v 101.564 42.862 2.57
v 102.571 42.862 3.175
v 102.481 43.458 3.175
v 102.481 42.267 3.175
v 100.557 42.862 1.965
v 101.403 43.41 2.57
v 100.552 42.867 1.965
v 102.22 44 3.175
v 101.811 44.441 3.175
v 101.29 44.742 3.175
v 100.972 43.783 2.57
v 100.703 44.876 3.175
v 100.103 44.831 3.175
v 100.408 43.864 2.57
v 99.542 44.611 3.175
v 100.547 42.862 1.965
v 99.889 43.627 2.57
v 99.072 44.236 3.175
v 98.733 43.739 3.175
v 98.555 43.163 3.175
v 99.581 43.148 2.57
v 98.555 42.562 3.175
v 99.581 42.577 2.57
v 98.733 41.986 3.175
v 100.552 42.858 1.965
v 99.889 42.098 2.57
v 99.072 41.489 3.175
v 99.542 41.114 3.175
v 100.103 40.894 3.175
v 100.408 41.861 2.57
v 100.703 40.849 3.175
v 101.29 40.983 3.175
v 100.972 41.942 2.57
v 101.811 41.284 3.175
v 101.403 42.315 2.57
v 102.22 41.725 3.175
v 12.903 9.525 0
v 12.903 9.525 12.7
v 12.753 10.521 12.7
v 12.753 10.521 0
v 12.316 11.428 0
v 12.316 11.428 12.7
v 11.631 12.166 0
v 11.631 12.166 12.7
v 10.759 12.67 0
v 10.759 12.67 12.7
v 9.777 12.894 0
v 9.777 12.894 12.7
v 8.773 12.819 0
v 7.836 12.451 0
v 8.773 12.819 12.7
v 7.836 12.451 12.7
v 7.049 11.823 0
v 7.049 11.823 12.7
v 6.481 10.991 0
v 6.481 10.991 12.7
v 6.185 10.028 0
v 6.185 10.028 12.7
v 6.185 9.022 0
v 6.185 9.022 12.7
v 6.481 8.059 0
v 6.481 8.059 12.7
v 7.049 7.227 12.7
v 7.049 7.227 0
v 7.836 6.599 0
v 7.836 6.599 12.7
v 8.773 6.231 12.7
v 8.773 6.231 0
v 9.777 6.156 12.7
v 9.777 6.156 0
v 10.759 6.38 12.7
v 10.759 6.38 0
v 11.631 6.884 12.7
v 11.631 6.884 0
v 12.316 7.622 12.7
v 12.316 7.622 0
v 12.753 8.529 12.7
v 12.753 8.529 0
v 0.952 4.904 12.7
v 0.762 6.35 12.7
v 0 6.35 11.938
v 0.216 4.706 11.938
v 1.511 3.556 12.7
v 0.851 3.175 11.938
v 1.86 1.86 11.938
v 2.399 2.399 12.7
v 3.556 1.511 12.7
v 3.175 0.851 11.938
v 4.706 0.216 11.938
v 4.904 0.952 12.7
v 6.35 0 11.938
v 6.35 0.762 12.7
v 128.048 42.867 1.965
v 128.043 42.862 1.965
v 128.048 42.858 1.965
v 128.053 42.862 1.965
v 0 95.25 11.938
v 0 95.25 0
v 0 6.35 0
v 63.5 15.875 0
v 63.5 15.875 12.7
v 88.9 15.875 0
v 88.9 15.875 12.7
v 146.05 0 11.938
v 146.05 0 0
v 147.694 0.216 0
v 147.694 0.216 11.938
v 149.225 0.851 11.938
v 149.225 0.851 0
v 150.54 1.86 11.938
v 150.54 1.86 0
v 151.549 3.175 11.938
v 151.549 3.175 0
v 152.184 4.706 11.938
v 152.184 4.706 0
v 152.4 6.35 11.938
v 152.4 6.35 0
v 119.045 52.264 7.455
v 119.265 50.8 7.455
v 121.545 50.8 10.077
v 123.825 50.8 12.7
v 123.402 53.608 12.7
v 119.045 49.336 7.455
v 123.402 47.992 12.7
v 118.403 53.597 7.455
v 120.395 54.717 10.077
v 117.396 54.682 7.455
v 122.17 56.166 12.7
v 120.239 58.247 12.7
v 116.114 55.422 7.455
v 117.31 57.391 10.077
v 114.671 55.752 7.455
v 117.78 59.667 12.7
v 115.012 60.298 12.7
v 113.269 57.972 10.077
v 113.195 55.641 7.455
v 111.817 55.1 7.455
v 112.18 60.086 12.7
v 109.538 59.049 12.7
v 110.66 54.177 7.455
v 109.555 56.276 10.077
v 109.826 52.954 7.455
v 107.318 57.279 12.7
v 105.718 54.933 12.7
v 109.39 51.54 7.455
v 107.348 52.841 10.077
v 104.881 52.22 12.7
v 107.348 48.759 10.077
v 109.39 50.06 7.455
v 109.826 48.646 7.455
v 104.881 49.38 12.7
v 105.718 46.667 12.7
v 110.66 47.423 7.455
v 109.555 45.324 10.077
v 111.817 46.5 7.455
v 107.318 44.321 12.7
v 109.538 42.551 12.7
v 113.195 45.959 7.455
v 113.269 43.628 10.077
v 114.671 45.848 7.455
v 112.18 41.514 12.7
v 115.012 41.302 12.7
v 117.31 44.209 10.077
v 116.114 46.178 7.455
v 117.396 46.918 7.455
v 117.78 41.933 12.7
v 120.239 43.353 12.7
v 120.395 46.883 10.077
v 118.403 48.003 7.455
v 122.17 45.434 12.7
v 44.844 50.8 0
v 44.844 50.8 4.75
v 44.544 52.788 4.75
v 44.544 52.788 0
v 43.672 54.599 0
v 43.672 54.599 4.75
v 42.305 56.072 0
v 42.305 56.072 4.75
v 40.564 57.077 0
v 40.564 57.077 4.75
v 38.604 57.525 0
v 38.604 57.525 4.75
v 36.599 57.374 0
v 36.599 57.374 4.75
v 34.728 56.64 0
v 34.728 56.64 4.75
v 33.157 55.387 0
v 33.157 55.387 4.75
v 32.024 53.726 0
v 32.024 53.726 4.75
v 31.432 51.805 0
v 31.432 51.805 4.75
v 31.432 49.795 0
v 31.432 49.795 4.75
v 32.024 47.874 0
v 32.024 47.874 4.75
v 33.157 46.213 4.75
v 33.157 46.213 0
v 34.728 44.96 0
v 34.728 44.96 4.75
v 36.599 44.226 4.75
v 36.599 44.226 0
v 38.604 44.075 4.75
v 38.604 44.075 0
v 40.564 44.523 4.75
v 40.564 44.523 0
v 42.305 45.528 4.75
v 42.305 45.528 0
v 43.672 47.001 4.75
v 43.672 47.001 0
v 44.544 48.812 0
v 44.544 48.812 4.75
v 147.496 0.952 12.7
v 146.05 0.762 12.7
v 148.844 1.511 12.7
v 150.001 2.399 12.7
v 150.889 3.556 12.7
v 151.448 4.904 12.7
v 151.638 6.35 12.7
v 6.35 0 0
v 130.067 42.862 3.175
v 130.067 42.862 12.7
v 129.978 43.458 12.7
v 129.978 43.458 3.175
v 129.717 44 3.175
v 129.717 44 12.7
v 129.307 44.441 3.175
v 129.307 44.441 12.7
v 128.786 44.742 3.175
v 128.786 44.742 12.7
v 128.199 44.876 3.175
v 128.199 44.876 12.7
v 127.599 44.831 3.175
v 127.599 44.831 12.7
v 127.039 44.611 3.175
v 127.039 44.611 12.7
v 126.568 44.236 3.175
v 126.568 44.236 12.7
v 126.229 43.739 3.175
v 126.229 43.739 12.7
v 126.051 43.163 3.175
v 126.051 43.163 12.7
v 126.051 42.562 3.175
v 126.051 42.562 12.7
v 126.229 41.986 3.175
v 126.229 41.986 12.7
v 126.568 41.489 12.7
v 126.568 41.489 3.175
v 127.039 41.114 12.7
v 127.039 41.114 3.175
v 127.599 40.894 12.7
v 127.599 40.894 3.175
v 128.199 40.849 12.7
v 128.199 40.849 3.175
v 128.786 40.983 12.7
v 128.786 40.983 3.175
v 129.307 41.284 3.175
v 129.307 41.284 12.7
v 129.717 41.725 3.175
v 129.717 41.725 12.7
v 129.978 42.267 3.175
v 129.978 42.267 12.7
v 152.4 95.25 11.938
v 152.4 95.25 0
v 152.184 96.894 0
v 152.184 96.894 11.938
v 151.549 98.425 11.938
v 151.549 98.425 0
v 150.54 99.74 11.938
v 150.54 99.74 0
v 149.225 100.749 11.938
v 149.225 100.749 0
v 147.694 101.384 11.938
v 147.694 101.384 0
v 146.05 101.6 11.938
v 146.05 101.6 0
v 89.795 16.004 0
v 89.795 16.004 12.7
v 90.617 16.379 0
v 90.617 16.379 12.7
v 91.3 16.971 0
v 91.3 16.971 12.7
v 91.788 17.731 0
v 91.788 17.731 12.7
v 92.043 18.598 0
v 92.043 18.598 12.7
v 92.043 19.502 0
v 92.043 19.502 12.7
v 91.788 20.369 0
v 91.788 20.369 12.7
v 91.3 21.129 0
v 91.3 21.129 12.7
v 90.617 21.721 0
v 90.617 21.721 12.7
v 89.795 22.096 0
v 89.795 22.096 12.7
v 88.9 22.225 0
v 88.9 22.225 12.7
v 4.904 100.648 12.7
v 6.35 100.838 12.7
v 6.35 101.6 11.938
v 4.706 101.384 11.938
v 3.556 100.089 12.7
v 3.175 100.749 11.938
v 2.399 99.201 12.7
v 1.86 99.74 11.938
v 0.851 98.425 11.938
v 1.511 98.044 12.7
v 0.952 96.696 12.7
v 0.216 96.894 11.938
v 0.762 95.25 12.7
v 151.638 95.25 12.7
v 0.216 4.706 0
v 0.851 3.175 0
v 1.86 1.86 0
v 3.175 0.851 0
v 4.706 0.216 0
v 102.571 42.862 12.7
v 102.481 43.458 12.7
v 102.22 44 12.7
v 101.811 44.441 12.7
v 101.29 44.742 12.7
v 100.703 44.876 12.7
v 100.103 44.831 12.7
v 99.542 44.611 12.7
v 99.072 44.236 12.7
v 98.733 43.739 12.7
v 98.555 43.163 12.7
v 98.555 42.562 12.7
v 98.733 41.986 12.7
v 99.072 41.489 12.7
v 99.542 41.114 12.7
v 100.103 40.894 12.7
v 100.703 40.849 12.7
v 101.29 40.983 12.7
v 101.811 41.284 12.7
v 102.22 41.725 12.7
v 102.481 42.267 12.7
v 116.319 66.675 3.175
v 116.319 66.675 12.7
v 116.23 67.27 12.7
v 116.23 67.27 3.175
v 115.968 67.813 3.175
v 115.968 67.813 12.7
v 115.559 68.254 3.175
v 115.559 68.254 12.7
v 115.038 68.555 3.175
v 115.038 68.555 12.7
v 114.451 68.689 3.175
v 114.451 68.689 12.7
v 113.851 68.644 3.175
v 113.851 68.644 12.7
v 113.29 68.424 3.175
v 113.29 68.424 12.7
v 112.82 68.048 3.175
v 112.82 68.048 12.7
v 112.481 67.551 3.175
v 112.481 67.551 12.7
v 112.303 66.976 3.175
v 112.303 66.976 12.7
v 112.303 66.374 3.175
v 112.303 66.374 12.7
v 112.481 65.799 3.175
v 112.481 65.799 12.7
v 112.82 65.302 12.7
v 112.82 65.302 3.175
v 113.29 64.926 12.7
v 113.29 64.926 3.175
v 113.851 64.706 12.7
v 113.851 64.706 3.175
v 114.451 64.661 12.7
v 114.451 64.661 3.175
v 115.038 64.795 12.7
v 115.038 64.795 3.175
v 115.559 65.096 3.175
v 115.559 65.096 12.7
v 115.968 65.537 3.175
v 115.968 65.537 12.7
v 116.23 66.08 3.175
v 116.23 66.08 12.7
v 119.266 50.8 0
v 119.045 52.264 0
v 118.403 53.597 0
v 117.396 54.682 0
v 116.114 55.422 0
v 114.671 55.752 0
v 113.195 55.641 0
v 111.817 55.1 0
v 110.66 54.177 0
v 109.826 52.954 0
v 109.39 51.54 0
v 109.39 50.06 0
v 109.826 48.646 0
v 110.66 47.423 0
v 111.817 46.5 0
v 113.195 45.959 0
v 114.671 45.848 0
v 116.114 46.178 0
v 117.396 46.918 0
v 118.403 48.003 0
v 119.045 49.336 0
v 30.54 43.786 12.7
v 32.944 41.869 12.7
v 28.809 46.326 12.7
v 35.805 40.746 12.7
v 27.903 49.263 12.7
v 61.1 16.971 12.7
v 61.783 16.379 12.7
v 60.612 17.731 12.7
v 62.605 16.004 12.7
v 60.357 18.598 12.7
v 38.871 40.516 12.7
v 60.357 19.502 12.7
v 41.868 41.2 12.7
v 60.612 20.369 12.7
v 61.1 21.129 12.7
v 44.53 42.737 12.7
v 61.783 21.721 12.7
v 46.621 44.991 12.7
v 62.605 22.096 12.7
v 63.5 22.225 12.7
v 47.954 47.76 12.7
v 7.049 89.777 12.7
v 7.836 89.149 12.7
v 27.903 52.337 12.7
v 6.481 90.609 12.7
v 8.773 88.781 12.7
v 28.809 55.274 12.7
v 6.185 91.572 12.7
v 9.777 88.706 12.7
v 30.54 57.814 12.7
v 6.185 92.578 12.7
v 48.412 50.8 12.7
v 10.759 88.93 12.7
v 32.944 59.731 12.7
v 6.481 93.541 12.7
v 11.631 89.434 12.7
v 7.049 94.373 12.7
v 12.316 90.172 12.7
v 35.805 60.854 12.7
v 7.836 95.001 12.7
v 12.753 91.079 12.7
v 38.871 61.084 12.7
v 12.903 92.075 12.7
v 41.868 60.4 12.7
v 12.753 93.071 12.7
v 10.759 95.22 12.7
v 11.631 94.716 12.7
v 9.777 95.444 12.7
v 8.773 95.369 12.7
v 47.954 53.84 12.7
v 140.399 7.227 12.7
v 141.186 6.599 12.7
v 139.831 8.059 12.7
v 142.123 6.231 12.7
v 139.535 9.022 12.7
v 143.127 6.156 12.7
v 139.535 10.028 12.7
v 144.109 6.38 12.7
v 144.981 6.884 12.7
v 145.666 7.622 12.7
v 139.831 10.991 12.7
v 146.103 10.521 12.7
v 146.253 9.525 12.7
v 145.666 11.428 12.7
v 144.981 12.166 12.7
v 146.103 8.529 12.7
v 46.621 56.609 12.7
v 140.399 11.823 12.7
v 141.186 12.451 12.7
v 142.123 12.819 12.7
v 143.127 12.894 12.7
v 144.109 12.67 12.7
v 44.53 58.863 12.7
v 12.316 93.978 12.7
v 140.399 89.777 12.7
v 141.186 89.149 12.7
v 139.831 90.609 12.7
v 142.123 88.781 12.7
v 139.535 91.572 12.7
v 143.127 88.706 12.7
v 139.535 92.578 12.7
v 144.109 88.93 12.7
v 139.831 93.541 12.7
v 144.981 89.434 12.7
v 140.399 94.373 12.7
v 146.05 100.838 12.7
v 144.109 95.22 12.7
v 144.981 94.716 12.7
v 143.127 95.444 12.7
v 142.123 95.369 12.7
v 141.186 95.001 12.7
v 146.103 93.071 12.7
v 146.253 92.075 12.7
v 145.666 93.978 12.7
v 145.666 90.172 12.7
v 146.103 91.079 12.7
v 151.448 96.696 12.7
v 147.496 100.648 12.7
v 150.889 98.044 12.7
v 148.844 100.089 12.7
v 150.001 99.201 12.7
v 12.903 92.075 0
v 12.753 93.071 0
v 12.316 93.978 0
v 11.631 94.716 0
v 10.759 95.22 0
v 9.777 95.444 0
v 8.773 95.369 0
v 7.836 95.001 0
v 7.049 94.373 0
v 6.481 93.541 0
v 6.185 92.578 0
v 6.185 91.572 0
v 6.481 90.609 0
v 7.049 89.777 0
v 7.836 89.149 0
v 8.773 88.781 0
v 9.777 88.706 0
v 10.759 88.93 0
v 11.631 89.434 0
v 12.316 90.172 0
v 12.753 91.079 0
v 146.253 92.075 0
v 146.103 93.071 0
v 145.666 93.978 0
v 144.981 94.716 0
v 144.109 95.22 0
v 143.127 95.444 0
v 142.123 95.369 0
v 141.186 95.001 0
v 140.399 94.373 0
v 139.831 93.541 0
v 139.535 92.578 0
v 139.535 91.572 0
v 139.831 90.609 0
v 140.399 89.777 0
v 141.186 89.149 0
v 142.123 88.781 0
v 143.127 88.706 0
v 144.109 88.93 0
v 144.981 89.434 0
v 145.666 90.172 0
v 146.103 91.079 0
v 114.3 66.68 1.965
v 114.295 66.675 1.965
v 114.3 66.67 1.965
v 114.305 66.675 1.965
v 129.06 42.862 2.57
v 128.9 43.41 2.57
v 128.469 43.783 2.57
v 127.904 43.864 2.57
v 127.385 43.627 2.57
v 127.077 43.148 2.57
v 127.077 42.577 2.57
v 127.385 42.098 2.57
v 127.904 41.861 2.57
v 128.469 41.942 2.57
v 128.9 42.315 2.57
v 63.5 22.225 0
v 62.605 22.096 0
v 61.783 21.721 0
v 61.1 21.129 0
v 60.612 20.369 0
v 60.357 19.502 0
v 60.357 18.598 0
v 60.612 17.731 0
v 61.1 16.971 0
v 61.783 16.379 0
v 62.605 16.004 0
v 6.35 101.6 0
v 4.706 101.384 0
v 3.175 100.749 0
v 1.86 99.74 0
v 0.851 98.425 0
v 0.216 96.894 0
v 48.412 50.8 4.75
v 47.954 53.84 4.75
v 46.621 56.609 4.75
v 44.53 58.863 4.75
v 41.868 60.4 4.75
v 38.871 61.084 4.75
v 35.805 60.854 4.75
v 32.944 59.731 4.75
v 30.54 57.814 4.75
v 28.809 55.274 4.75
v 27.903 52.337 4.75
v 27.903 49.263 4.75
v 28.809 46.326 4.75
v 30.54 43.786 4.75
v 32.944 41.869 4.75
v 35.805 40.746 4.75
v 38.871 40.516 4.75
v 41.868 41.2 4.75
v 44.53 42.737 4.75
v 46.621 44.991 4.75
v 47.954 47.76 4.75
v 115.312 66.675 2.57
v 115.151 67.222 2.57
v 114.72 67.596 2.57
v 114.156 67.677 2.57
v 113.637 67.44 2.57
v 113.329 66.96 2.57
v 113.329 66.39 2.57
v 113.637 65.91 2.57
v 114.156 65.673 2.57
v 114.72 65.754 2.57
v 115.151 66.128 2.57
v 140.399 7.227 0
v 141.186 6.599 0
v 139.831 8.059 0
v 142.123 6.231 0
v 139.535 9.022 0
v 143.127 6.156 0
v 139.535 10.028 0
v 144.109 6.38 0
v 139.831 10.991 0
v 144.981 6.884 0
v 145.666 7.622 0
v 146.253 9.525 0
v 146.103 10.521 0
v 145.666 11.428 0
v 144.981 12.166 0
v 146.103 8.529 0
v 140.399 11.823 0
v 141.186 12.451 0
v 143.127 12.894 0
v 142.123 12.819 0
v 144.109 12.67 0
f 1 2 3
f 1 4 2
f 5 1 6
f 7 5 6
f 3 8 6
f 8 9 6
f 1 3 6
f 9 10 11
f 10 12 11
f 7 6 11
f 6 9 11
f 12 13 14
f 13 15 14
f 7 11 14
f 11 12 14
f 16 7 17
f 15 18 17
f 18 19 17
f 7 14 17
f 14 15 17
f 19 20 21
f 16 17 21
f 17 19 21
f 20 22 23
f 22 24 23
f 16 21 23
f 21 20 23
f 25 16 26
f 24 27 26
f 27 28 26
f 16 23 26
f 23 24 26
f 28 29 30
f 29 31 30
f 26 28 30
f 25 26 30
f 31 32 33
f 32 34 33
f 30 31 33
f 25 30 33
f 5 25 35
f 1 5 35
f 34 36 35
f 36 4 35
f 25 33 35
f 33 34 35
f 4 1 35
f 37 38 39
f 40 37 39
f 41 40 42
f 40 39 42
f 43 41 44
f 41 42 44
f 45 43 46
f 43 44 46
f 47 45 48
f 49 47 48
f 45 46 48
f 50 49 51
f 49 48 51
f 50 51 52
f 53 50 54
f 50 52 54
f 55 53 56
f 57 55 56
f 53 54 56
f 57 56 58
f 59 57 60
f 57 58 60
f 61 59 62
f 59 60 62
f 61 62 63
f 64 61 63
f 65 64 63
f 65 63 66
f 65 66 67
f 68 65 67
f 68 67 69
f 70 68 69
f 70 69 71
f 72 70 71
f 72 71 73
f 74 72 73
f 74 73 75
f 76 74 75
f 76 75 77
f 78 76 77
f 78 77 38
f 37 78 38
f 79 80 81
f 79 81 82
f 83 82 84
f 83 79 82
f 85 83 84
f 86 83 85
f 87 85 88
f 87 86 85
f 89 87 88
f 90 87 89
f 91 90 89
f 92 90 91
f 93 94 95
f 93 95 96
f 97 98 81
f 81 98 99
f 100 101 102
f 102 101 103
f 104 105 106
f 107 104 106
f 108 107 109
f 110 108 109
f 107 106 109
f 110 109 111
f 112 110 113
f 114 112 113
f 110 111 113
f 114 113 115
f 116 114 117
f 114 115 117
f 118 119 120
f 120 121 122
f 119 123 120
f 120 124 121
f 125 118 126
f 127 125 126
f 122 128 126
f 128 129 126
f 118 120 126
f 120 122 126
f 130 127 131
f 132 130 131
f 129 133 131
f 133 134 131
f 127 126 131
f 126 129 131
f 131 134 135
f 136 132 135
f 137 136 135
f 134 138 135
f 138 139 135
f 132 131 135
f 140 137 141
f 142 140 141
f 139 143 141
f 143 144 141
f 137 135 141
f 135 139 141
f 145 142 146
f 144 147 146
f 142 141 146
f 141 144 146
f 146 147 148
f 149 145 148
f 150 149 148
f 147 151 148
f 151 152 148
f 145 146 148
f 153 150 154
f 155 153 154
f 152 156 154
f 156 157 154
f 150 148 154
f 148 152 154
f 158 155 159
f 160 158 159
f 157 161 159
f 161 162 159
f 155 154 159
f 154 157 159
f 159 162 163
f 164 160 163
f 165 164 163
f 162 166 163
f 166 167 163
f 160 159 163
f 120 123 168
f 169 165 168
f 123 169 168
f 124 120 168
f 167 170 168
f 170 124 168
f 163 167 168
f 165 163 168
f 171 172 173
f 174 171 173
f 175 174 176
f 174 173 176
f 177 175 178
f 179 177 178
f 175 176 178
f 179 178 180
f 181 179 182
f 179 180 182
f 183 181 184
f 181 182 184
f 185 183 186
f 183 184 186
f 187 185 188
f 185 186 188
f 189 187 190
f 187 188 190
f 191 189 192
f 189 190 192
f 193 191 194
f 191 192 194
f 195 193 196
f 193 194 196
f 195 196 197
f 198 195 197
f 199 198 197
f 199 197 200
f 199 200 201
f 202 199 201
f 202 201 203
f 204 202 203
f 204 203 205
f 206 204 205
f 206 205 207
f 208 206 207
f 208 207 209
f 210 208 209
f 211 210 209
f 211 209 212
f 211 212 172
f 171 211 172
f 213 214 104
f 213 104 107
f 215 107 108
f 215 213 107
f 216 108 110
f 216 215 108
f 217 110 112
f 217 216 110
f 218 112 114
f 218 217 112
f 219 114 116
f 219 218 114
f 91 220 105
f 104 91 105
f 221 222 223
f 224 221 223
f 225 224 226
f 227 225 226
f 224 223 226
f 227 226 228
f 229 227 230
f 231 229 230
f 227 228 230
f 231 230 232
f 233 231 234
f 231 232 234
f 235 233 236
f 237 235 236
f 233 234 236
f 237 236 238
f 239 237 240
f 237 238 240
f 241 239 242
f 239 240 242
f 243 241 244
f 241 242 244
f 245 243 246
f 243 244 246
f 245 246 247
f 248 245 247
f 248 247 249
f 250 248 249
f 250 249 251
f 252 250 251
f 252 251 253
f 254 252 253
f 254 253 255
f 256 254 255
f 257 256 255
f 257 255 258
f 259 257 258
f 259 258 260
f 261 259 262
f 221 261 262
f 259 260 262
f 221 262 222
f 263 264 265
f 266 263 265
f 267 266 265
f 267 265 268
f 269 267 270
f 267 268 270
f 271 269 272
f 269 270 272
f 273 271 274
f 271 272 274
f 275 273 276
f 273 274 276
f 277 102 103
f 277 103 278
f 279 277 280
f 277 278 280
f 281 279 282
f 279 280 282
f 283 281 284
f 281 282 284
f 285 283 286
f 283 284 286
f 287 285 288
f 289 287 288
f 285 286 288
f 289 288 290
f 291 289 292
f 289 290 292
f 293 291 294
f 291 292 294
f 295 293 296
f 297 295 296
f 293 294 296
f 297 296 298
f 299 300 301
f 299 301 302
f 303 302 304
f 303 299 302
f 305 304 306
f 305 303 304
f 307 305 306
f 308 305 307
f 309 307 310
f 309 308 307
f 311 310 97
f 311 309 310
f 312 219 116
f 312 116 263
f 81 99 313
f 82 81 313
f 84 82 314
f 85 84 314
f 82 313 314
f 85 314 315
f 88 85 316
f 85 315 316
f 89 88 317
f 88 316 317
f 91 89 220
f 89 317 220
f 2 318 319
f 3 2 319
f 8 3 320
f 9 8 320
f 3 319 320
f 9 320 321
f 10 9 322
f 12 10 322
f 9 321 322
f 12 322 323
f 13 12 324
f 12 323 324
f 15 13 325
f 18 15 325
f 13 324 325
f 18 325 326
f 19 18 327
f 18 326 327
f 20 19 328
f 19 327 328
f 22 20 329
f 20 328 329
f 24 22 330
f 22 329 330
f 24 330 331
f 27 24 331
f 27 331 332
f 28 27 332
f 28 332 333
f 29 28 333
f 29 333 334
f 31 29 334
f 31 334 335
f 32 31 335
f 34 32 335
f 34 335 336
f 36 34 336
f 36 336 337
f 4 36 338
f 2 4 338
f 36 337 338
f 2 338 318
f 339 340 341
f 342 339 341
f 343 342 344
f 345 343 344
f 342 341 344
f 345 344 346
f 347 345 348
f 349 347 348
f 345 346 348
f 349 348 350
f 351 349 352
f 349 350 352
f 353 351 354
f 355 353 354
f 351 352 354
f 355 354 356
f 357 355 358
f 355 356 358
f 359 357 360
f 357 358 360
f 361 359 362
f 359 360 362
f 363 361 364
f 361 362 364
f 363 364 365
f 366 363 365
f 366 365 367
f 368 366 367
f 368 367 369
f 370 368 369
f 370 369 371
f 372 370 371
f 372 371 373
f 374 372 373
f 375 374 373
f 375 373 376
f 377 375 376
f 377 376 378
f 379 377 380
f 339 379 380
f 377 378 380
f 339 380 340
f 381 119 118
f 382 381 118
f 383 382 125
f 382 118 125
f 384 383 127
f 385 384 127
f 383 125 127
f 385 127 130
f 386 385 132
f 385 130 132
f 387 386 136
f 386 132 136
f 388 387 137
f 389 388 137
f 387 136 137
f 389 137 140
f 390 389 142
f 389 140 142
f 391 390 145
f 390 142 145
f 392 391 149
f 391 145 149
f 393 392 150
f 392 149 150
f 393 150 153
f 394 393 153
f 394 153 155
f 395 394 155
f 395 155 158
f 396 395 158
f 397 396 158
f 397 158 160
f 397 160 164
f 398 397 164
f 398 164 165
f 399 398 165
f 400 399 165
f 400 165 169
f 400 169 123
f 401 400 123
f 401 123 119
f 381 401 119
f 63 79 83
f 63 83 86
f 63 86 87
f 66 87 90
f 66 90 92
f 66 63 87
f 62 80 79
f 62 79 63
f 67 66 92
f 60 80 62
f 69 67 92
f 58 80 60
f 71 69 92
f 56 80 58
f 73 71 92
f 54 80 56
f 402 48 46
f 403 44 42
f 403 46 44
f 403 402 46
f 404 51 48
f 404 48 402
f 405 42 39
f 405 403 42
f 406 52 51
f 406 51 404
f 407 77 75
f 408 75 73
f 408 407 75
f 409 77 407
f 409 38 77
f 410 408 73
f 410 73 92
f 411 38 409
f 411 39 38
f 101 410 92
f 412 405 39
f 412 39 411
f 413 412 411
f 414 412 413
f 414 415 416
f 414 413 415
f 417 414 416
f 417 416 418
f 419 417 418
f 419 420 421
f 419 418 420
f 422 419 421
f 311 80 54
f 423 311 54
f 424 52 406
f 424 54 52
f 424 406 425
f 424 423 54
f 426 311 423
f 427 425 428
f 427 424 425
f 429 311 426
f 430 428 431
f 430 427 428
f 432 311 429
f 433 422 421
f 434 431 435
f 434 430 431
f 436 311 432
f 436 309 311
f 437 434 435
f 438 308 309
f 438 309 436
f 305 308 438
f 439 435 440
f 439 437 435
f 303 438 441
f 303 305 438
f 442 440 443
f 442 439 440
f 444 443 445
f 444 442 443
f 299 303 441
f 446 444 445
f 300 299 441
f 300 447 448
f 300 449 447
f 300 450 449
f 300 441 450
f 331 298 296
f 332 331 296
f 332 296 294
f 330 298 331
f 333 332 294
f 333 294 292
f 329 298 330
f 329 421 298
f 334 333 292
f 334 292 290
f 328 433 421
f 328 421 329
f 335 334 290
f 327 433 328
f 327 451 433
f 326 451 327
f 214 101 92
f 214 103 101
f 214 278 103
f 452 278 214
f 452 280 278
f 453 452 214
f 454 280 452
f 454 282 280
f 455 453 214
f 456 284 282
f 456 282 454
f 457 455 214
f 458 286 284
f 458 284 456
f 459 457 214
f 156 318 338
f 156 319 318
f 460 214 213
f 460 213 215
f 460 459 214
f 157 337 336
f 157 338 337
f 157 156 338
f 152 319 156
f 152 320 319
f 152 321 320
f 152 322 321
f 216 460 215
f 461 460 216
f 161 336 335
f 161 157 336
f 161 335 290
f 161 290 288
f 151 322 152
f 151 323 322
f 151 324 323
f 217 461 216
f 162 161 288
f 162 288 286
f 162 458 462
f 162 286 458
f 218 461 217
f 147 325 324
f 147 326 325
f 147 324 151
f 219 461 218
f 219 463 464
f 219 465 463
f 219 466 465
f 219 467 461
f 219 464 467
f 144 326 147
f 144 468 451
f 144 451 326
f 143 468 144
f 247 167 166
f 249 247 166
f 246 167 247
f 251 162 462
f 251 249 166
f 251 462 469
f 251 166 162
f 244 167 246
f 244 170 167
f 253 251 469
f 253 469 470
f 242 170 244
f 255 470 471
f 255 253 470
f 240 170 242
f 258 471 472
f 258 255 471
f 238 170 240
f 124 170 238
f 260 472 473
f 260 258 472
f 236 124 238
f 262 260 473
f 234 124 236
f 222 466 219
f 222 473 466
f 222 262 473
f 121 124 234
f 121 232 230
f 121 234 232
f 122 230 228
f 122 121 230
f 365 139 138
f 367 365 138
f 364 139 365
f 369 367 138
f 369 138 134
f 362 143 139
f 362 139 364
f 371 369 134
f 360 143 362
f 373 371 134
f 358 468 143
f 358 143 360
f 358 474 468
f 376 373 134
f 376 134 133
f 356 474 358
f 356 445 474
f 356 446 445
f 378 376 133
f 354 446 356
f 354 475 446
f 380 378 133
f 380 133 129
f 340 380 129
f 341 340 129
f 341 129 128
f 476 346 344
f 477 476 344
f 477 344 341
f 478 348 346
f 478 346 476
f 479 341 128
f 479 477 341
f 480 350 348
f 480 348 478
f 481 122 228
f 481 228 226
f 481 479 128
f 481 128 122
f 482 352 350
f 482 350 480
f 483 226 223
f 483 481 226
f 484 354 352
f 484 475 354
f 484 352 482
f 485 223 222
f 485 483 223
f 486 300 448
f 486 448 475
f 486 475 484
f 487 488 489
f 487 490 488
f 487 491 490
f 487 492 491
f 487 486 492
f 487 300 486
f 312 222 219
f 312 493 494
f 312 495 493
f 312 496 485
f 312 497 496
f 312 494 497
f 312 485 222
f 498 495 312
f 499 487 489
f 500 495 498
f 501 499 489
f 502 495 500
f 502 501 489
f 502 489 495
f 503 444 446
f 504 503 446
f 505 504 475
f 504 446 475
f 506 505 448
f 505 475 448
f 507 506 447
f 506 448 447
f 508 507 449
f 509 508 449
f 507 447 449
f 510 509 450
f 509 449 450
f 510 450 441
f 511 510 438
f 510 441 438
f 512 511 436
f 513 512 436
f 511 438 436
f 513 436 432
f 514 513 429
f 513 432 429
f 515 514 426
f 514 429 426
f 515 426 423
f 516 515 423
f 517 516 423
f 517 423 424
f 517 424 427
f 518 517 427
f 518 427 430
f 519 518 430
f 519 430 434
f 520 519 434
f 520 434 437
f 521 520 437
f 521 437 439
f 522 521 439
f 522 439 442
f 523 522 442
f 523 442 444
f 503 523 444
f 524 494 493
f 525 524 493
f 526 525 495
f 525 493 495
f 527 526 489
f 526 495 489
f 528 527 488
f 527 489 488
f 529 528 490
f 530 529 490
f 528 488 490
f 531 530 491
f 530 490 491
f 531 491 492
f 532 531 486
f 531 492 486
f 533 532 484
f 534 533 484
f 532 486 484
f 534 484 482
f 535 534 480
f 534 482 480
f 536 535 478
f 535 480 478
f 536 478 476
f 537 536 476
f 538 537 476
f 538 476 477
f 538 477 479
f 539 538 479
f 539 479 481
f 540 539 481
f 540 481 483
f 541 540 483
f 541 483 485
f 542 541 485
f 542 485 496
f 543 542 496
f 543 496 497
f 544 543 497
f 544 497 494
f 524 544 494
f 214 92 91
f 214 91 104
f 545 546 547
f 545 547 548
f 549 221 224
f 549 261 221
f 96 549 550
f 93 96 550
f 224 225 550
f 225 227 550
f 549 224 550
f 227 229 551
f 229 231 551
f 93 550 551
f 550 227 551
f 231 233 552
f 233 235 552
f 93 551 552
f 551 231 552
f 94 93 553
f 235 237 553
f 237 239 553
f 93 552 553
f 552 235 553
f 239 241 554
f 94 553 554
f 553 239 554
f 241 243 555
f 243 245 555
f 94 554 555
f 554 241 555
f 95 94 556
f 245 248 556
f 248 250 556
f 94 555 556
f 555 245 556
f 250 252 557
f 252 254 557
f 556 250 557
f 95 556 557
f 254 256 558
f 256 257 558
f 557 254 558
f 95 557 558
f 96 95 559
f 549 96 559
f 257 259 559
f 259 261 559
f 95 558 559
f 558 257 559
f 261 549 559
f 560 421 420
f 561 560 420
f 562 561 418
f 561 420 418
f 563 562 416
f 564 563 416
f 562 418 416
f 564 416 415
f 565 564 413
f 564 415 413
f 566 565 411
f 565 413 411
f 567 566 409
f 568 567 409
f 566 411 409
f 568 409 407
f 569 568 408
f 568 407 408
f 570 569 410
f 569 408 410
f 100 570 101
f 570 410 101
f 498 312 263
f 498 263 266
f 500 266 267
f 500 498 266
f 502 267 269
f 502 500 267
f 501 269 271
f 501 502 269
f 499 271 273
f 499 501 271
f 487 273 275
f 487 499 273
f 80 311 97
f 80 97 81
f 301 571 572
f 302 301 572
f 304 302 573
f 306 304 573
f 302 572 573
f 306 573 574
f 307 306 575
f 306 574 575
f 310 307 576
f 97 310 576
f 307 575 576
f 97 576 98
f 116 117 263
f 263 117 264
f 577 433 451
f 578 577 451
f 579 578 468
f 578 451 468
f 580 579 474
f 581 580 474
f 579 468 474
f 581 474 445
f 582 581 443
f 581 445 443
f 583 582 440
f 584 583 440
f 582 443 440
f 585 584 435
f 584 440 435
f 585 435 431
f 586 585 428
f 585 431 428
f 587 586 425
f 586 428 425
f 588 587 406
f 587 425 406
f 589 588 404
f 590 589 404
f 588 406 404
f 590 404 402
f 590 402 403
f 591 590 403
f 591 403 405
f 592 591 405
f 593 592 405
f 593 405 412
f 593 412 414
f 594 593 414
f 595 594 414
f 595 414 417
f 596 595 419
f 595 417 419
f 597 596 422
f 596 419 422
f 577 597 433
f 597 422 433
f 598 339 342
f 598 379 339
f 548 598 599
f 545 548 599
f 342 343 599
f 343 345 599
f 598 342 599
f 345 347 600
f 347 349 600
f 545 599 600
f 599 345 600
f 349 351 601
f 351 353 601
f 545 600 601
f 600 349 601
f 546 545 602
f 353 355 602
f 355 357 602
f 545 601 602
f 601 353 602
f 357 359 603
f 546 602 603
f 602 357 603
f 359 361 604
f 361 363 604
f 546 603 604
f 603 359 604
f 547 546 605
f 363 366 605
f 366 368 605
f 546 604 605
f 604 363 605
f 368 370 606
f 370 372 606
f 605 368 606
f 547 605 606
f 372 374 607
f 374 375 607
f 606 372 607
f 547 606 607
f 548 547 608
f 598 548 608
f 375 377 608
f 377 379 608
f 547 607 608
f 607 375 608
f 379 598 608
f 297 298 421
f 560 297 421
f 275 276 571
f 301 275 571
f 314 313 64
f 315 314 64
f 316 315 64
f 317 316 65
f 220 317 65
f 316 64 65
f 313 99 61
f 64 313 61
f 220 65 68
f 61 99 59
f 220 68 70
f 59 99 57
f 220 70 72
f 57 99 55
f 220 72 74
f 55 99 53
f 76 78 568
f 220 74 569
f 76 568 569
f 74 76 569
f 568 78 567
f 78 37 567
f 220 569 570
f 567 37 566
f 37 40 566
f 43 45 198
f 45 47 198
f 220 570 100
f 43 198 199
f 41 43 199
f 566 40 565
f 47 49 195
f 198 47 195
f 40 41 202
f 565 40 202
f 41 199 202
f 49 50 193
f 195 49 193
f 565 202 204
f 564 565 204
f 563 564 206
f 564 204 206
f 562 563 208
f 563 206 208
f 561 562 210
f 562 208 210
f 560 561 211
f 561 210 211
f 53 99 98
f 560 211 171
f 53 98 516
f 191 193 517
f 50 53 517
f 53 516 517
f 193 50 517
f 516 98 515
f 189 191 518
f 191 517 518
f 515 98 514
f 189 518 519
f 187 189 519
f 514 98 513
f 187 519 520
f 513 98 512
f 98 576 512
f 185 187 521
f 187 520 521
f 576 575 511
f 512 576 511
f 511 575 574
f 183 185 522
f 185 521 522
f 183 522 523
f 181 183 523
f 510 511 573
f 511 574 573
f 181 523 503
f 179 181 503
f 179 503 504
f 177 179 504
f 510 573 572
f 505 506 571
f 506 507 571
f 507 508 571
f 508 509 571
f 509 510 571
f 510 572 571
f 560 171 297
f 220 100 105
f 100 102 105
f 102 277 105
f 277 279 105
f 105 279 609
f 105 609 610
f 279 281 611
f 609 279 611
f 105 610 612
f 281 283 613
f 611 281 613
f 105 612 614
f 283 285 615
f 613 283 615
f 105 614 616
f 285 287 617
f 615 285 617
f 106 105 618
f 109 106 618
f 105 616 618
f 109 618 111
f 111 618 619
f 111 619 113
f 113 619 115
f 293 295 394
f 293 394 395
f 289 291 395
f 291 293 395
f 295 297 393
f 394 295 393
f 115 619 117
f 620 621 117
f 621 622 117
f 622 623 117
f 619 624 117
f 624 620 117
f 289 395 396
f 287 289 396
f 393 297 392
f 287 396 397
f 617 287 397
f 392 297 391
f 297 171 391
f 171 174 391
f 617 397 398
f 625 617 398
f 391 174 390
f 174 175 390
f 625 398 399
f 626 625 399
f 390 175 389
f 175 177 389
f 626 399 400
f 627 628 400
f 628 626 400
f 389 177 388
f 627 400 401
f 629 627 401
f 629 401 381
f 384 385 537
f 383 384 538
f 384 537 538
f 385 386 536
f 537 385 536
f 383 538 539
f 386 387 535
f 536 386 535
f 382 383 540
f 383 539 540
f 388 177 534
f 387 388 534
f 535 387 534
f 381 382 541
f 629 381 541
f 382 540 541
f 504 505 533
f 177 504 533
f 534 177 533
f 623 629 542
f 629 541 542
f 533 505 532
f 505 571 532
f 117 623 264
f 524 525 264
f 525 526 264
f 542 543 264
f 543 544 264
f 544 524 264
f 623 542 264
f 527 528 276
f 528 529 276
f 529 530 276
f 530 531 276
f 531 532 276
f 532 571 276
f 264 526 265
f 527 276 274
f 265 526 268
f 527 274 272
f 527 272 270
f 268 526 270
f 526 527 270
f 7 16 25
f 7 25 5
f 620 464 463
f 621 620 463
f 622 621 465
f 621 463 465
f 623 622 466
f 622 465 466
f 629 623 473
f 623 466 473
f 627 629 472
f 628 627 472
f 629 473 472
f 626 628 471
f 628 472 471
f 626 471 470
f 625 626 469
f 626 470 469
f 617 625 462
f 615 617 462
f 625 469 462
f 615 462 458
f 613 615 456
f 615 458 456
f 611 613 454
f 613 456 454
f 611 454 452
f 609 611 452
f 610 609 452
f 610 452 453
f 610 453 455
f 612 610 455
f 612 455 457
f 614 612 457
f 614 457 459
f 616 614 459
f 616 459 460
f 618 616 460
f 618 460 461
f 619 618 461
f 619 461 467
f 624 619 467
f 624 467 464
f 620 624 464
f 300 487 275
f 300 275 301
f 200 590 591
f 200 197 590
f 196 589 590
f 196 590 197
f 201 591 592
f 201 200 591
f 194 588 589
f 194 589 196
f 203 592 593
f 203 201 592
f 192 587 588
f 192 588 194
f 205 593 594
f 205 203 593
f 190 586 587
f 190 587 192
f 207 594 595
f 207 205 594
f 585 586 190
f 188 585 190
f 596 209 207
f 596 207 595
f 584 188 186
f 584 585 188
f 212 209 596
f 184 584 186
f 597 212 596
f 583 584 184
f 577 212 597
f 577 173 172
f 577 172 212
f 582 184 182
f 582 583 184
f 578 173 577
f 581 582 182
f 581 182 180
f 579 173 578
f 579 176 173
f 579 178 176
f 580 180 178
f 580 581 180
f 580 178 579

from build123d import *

# Parameters (mm, degrees)
EXTRUDE_1_DEPTH               = 12.7
SKETCH_2_R                    = 3.3782
CUT_EXTRUDE_1_DEPTH           = 184.601770144
SKETCH_5_R                    = 10.3125
CUT_EXTRUDE_4_DEPTH           = 7.95
SKETCH_6_R                    = 6.7435
CUT_EXTRUDE_5_DEPTH           = 184.601770144
SKETCH_7_R                    = 9.525
CUT_EXTRUDE_6_DEPTH           = 5.245104753
CUT_EXTRUDE_6_DRAFT           = -41
SKETCH_8_R                    = 4.9655
CUT_EXTRUDE_7_DEPTH           = 184.601770144
SKETCH_9_R                    = 2.0193
CUT_EXTRUDE_8_DEPTH           = 9.525
SKETCH_10_R                   = 2.0193
CUT_EXTRUDE_9_DEPTH           = 1.210313545
CUT_EXTRUDE_9_DRAFT           = -59
CUT_EXTRUDE_9_PROFILE_2_DEPTH = 1.210313545
CUT_EXTRUDE_9_PROFILE_2_DRAFT = -59
CUT_EXTRUDE_9_PROFILE_3_DEPTH = 1.210313545
CUT_EXTRUDE_9_PROFILE_3_DRAFT = -59
CUT_EXTRUDE_10_DEPTH          = 184.601770144
CHAMFER_1_SIZE                = 0.762


with BuildPart() as part:
    # 草图1 → 凸台-拉伸1 (new body)
    with BuildSketch(Plane.XY):
        with BuildLine():
            Line((6.35, 0), (146.05, 0))
            ThreePointArc((146.05, 0), (150.540128061, 1.859871939), (152.4, 6.35))
            Line((152.4, 6.35), (152.4, 95.25))
            ThreePointArc((152.4, 95.25), (150.540128061, 99.740128061), (146.05, 101.6))
            Line((146.05, 101.6), (6.35, 101.6))
            ThreePointArc((6.35, 101.6), (1.859871939, 99.740128061), (0, 95.25))
            Line((0, 95.25), (0, 6.35))
            ThreePointArc((0, 6.35), (1.859871939, 1.859871939), (6.35, 0))
        make_face()
    extrude(amount=EXTRUDE_1_DEPTH)

    # 草图2 → 切除-拉伸1 (cut, through all)
    with BuildSketch(Plane.XY.offset(12.7)):
        with Locations((9.525, 9.525)):
            Circle(SKETCH_2_R)
        with Locations((142.875, 9.525)):
            Circle(SKETCH_2_R)
        with Locations((9.525, 92.075)):
            Circle(SKETCH_2_R)
        with Locations((142.875, 92.075)):
            Circle(SKETCH_2_R)
    extrude(amount=-CUT_EXTRUDE_1_DEPTH, mode=Mode.SUBTRACT)

    # 草图5 → 切除-拉伸4 (cut)
    with BuildSketch(Plane.XY.offset(12.7)):
        with Locations((38.1, 50.8)):
            Circle(SKETCH_5_R)
    extrude(amount=-CUT_EXTRUDE_4_DEPTH, mode=Mode.SUBTRACT)

    # 草图6 → 切除-拉伸5 (cut, through all)
    with BuildSketch(Plane.XY.offset(12.7)):
        with Locations((38.1, 50.8)):
            Circle(SKETCH_6_R)
    extrude(amount=-CUT_EXTRUDE_5_DEPTH, mode=Mode.SUBTRACT)


with BuildPart() as cut_extrude_6_tool:
    # 草图7 → 切除-拉伸6 (with draft: the straight prism first)
    with BuildSketch(Plane.XY.offset(12.7)):
        with Locations((114.3, 50.8)):
            Circle(SKETCH_7_R)
    extrude(amount=-CUT_EXTRUDE_6_DEPTH)
    # 切除-拉伸6: the draft: its side faces are tilted about the plane it starts from
    cut_extrude_6_sides = [cut_extrude_6_tool.faces().sort_by_distance(p)[0] for p in [
        (104.775, 50.8, 10.077447624),
    ]]
    draft(cut_extrude_6_sides, Plane.XY.offset(12.7), CUT_EXTRUDE_6_DRAFT)


with BuildPart() as part_1:
    add(part.part)

    # 切除-拉伸6: cut by cut_extrude_6_tool
    add(cut_extrude_6_tool.part, mode=Mode.SUBTRACT)

    # 草图8 → 切除-拉伸7 (cut, through all)
    with BuildSketch(Plane.XY.offset(12.7)):
        with Locations((114.3, 50.8)):
            Circle(SKETCH_8_R)
    extrude(amount=-CUT_EXTRUDE_7_DEPTH, mode=Mode.SUBTRACT)

    # 草图9 → 切除-拉伸8 (cut)
    with BuildSketch(Plane.XY.offset(12.7)):
        with Locations((114.3, 66.675)):
            Circle(SKETCH_9_R)
        with Locations((100.551847, 42.8625)):
            Circle(SKETCH_9_R)
        with Locations((128.048153, 42.8625)):
            Circle(SKETCH_9_R)
    extrude(amount=-CUT_EXTRUDE_8_DEPTH, mode=Mode.SUBTRACT)


with BuildPart() as cut_extrude_9_tool:
    # 草图10 → 切除-拉伸9 (with draft: the straight prism first)
    with BuildSketch(Plane.XY.offset(3.175)):
        with Locations((114.3, 66.675)):
            Circle(SKETCH_10_R)
    extrude(amount=-CUT_EXTRUDE_9_DEPTH)
    # 切除-拉伸9: the draft: its side faces are tilted about the plane it starts from
    cut_extrude_9_sides = [cut_extrude_9_tool.faces().sort_by_distance(p)[0] for p in [
        (112.2807, 66.675, 2.569843228),
    ]]
    draft(cut_extrude_9_sides, Plane.XY.offset(3.175), CUT_EXTRUDE_9_DRAFT)


with BuildPart() as part_2:
    add(part_1.part)

    # 切除-拉伸9: cut by cut_extrude_9_tool
    add(cut_extrude_9_tool.part, mode=Mode.SUBTRACT)


with BuildPart() as cut_extrude_9_profile_2_tool:
    # 草图10 → 切除-拉伸9 profile 2 (with draft: the straight prism first)
    with BuildSketch(Plane.XY.offset(3.175)):
        with Locations((100.551847, 42.8625)):
            Circle(SKETCH_10_R)
    extrude(amount=-CUT_EXTRUDE_9_PROFILE_2_DEPTH)
    # 切除-拉伸9 profile 2: the draft: its side faces are tilted about the plane it starts from
    cut_extrude_9_profile_2_sides = [cut_extrude_9_profile_2_tool.faces().sort_by_distance(p)[0] for p in [
        (98.532547, 42.8625, 2.569843228),
    ]]
    draft(cut_extrude_9_profile_2_sides, Plane.XY.offset(3.175), CUT_EXTRUDE_9_PROFILE_2_DRAFT)


with BuildPart() as part_3:
    add(part_2.part)

    # 切除-拉伸9 profile 2: cut by cut_extrude_9_profile_2_tool
    add(cut_extrude_9_profile_2_tool.part, mode=Mode.SUBTRACT)


with BuildPart() as cut_extrude_9_profile_3_tool:
    # 草图10 → 切除-拉伸9 profile 3 (with draft: the straight prism first)
    with BuildSketch(Plane.XY.offset(3.175)):
        with Locations((128.048153, 42.8625)):
            Circle(SKETCH_10_R)
    extrude(amount=-CUT_EXTRUDE_9_PROFILE_3_DEPTH)
    # 切除-拉伸9 profile 3: the draft: its side faces are tilted about the plane it starts from
    cut_extrude_9_profile_3_sides = [cut_extrude_9_profile_3_tool.faces().sort_by_distance(p)[0] for p in [
        (126.028853, 42.8625, 2.569843228),
    ]]
    draft(cut_extrude_9_profile_3_sides, Plane.XY.offset(3.175), CUT_EXTRUDE_9_PROFILE_3_DRAFT)


with BuildPart() as part_4:
    add(part_3.part)

    # 切除-拉伸9 profile 3: cut by cut_extrude_9_profile_3_tool
    add(cut_extrude_9_profile_3_tool.part, mode=Mode.SUBTRACT)

    # 草图11 → 切除-拉伸10 (cut, through all)
    with BuildSketch(Plane.XY.offset(12.7)):
        with BuildLine():
            Line((63.5, 15.875), (88.9, 15.875))
            ThreePointArc((88.9, 15.875), (92.075, 19.05), (88.9, 22.225))
            Line((88.9, 22.225), (63.5, 22.225))
            ThreePointArc((63.5, 22.225), (60.325, 19.05), (63.5, 15.875))
        make_face()
    extrude(amount=-CUT_EXTRUDE_10_DEPTH, mode=Mode.SUBTRACT)

    # 倒角1
    chamfer_1_edges = [part_4.edges().sort_by_distance(p)[0] for p in [
        (150.540128061, 1.859871939, 12.7),
        (152.4, 50.8, 12.7),
        (150.540128061, 99.740128061, 12.7),
        (76.2, 101.6, 12.7),
        (1.859871939, 99.740128061, 12.7),
        (0, 50.8, 12.7),
        (1.859871939, 1.859871939, 12.7),
        (76.2, 0, 12.7),
    ]]
    chamfer(chamfer_1_edges, length=CHAMFER_1_SIZE)


solid = part_4.part
